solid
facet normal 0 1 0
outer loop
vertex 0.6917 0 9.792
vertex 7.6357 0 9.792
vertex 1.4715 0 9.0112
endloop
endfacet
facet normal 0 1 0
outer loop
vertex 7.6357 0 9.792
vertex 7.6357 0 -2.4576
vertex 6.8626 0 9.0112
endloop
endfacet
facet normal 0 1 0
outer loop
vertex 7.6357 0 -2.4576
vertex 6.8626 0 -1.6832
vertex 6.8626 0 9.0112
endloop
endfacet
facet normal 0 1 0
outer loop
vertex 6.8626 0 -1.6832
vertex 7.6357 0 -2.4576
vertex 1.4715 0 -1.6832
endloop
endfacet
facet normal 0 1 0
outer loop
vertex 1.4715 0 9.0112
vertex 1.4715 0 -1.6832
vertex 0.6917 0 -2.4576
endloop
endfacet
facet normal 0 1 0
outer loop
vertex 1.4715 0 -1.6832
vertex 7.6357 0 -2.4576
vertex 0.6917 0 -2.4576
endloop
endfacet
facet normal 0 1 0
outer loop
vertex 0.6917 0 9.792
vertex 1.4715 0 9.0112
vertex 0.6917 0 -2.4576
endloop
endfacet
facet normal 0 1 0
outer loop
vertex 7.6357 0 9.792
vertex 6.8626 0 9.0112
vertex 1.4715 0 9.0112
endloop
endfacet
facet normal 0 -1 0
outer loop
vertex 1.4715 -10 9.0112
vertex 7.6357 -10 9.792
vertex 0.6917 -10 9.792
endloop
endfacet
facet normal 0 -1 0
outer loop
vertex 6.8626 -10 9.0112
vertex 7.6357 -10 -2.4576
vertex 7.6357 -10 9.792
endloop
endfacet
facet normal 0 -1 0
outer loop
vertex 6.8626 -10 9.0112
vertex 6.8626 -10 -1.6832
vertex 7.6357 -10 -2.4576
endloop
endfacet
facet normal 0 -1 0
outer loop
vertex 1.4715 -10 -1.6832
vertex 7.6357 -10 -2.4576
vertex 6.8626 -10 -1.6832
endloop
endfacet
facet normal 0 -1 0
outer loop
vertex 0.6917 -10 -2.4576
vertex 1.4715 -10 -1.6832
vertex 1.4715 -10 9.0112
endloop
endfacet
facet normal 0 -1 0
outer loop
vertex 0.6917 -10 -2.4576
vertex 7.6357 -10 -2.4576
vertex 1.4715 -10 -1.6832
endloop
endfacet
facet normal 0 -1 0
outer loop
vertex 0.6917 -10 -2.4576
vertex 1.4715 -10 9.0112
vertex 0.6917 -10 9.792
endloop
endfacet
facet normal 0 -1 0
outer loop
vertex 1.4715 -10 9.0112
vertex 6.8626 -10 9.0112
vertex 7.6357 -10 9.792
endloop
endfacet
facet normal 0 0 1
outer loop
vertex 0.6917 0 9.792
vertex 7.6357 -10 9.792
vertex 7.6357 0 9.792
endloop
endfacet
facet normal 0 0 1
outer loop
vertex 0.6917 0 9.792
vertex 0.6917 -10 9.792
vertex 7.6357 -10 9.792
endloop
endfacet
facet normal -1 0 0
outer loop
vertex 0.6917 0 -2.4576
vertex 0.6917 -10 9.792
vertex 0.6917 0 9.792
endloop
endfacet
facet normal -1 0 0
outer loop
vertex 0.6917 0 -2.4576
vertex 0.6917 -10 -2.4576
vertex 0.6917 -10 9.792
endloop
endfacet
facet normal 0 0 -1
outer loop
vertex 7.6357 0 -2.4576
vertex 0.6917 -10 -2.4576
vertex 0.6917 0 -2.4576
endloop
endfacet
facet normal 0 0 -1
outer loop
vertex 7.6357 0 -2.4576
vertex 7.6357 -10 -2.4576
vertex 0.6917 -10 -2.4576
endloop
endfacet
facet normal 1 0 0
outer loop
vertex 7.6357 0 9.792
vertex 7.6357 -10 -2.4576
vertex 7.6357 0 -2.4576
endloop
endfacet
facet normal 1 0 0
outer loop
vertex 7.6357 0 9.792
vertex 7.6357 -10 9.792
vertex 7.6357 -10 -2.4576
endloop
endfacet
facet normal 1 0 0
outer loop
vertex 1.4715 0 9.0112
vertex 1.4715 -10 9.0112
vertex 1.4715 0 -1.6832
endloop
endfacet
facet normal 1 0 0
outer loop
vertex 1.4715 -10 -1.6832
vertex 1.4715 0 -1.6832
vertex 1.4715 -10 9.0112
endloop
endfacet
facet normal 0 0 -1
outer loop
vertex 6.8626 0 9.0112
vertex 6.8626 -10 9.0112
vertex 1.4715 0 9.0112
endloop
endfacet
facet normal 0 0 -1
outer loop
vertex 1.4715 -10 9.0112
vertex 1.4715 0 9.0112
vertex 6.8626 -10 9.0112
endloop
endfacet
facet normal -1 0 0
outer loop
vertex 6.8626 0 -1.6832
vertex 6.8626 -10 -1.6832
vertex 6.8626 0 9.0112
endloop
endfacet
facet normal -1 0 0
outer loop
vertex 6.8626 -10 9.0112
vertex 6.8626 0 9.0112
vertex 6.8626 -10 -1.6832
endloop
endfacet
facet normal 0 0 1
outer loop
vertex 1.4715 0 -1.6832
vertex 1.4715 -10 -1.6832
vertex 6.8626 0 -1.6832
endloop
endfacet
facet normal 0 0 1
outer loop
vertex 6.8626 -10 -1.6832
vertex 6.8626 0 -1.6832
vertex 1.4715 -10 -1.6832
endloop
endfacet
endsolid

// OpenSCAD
height = 10;
word = "春";
font = "標楷體";

module chinese_word(word, font, height, center = true) {
    offset_for_center = center ? -height / 2 : 0;
    translate([offset_for_center, offset_for_center, offset_for_center])
    linear_extrude(height) 
        text(word, font = font);
}

rotate([90, 0, 0]) 
    chinese_word(word, font, height, center = false);
